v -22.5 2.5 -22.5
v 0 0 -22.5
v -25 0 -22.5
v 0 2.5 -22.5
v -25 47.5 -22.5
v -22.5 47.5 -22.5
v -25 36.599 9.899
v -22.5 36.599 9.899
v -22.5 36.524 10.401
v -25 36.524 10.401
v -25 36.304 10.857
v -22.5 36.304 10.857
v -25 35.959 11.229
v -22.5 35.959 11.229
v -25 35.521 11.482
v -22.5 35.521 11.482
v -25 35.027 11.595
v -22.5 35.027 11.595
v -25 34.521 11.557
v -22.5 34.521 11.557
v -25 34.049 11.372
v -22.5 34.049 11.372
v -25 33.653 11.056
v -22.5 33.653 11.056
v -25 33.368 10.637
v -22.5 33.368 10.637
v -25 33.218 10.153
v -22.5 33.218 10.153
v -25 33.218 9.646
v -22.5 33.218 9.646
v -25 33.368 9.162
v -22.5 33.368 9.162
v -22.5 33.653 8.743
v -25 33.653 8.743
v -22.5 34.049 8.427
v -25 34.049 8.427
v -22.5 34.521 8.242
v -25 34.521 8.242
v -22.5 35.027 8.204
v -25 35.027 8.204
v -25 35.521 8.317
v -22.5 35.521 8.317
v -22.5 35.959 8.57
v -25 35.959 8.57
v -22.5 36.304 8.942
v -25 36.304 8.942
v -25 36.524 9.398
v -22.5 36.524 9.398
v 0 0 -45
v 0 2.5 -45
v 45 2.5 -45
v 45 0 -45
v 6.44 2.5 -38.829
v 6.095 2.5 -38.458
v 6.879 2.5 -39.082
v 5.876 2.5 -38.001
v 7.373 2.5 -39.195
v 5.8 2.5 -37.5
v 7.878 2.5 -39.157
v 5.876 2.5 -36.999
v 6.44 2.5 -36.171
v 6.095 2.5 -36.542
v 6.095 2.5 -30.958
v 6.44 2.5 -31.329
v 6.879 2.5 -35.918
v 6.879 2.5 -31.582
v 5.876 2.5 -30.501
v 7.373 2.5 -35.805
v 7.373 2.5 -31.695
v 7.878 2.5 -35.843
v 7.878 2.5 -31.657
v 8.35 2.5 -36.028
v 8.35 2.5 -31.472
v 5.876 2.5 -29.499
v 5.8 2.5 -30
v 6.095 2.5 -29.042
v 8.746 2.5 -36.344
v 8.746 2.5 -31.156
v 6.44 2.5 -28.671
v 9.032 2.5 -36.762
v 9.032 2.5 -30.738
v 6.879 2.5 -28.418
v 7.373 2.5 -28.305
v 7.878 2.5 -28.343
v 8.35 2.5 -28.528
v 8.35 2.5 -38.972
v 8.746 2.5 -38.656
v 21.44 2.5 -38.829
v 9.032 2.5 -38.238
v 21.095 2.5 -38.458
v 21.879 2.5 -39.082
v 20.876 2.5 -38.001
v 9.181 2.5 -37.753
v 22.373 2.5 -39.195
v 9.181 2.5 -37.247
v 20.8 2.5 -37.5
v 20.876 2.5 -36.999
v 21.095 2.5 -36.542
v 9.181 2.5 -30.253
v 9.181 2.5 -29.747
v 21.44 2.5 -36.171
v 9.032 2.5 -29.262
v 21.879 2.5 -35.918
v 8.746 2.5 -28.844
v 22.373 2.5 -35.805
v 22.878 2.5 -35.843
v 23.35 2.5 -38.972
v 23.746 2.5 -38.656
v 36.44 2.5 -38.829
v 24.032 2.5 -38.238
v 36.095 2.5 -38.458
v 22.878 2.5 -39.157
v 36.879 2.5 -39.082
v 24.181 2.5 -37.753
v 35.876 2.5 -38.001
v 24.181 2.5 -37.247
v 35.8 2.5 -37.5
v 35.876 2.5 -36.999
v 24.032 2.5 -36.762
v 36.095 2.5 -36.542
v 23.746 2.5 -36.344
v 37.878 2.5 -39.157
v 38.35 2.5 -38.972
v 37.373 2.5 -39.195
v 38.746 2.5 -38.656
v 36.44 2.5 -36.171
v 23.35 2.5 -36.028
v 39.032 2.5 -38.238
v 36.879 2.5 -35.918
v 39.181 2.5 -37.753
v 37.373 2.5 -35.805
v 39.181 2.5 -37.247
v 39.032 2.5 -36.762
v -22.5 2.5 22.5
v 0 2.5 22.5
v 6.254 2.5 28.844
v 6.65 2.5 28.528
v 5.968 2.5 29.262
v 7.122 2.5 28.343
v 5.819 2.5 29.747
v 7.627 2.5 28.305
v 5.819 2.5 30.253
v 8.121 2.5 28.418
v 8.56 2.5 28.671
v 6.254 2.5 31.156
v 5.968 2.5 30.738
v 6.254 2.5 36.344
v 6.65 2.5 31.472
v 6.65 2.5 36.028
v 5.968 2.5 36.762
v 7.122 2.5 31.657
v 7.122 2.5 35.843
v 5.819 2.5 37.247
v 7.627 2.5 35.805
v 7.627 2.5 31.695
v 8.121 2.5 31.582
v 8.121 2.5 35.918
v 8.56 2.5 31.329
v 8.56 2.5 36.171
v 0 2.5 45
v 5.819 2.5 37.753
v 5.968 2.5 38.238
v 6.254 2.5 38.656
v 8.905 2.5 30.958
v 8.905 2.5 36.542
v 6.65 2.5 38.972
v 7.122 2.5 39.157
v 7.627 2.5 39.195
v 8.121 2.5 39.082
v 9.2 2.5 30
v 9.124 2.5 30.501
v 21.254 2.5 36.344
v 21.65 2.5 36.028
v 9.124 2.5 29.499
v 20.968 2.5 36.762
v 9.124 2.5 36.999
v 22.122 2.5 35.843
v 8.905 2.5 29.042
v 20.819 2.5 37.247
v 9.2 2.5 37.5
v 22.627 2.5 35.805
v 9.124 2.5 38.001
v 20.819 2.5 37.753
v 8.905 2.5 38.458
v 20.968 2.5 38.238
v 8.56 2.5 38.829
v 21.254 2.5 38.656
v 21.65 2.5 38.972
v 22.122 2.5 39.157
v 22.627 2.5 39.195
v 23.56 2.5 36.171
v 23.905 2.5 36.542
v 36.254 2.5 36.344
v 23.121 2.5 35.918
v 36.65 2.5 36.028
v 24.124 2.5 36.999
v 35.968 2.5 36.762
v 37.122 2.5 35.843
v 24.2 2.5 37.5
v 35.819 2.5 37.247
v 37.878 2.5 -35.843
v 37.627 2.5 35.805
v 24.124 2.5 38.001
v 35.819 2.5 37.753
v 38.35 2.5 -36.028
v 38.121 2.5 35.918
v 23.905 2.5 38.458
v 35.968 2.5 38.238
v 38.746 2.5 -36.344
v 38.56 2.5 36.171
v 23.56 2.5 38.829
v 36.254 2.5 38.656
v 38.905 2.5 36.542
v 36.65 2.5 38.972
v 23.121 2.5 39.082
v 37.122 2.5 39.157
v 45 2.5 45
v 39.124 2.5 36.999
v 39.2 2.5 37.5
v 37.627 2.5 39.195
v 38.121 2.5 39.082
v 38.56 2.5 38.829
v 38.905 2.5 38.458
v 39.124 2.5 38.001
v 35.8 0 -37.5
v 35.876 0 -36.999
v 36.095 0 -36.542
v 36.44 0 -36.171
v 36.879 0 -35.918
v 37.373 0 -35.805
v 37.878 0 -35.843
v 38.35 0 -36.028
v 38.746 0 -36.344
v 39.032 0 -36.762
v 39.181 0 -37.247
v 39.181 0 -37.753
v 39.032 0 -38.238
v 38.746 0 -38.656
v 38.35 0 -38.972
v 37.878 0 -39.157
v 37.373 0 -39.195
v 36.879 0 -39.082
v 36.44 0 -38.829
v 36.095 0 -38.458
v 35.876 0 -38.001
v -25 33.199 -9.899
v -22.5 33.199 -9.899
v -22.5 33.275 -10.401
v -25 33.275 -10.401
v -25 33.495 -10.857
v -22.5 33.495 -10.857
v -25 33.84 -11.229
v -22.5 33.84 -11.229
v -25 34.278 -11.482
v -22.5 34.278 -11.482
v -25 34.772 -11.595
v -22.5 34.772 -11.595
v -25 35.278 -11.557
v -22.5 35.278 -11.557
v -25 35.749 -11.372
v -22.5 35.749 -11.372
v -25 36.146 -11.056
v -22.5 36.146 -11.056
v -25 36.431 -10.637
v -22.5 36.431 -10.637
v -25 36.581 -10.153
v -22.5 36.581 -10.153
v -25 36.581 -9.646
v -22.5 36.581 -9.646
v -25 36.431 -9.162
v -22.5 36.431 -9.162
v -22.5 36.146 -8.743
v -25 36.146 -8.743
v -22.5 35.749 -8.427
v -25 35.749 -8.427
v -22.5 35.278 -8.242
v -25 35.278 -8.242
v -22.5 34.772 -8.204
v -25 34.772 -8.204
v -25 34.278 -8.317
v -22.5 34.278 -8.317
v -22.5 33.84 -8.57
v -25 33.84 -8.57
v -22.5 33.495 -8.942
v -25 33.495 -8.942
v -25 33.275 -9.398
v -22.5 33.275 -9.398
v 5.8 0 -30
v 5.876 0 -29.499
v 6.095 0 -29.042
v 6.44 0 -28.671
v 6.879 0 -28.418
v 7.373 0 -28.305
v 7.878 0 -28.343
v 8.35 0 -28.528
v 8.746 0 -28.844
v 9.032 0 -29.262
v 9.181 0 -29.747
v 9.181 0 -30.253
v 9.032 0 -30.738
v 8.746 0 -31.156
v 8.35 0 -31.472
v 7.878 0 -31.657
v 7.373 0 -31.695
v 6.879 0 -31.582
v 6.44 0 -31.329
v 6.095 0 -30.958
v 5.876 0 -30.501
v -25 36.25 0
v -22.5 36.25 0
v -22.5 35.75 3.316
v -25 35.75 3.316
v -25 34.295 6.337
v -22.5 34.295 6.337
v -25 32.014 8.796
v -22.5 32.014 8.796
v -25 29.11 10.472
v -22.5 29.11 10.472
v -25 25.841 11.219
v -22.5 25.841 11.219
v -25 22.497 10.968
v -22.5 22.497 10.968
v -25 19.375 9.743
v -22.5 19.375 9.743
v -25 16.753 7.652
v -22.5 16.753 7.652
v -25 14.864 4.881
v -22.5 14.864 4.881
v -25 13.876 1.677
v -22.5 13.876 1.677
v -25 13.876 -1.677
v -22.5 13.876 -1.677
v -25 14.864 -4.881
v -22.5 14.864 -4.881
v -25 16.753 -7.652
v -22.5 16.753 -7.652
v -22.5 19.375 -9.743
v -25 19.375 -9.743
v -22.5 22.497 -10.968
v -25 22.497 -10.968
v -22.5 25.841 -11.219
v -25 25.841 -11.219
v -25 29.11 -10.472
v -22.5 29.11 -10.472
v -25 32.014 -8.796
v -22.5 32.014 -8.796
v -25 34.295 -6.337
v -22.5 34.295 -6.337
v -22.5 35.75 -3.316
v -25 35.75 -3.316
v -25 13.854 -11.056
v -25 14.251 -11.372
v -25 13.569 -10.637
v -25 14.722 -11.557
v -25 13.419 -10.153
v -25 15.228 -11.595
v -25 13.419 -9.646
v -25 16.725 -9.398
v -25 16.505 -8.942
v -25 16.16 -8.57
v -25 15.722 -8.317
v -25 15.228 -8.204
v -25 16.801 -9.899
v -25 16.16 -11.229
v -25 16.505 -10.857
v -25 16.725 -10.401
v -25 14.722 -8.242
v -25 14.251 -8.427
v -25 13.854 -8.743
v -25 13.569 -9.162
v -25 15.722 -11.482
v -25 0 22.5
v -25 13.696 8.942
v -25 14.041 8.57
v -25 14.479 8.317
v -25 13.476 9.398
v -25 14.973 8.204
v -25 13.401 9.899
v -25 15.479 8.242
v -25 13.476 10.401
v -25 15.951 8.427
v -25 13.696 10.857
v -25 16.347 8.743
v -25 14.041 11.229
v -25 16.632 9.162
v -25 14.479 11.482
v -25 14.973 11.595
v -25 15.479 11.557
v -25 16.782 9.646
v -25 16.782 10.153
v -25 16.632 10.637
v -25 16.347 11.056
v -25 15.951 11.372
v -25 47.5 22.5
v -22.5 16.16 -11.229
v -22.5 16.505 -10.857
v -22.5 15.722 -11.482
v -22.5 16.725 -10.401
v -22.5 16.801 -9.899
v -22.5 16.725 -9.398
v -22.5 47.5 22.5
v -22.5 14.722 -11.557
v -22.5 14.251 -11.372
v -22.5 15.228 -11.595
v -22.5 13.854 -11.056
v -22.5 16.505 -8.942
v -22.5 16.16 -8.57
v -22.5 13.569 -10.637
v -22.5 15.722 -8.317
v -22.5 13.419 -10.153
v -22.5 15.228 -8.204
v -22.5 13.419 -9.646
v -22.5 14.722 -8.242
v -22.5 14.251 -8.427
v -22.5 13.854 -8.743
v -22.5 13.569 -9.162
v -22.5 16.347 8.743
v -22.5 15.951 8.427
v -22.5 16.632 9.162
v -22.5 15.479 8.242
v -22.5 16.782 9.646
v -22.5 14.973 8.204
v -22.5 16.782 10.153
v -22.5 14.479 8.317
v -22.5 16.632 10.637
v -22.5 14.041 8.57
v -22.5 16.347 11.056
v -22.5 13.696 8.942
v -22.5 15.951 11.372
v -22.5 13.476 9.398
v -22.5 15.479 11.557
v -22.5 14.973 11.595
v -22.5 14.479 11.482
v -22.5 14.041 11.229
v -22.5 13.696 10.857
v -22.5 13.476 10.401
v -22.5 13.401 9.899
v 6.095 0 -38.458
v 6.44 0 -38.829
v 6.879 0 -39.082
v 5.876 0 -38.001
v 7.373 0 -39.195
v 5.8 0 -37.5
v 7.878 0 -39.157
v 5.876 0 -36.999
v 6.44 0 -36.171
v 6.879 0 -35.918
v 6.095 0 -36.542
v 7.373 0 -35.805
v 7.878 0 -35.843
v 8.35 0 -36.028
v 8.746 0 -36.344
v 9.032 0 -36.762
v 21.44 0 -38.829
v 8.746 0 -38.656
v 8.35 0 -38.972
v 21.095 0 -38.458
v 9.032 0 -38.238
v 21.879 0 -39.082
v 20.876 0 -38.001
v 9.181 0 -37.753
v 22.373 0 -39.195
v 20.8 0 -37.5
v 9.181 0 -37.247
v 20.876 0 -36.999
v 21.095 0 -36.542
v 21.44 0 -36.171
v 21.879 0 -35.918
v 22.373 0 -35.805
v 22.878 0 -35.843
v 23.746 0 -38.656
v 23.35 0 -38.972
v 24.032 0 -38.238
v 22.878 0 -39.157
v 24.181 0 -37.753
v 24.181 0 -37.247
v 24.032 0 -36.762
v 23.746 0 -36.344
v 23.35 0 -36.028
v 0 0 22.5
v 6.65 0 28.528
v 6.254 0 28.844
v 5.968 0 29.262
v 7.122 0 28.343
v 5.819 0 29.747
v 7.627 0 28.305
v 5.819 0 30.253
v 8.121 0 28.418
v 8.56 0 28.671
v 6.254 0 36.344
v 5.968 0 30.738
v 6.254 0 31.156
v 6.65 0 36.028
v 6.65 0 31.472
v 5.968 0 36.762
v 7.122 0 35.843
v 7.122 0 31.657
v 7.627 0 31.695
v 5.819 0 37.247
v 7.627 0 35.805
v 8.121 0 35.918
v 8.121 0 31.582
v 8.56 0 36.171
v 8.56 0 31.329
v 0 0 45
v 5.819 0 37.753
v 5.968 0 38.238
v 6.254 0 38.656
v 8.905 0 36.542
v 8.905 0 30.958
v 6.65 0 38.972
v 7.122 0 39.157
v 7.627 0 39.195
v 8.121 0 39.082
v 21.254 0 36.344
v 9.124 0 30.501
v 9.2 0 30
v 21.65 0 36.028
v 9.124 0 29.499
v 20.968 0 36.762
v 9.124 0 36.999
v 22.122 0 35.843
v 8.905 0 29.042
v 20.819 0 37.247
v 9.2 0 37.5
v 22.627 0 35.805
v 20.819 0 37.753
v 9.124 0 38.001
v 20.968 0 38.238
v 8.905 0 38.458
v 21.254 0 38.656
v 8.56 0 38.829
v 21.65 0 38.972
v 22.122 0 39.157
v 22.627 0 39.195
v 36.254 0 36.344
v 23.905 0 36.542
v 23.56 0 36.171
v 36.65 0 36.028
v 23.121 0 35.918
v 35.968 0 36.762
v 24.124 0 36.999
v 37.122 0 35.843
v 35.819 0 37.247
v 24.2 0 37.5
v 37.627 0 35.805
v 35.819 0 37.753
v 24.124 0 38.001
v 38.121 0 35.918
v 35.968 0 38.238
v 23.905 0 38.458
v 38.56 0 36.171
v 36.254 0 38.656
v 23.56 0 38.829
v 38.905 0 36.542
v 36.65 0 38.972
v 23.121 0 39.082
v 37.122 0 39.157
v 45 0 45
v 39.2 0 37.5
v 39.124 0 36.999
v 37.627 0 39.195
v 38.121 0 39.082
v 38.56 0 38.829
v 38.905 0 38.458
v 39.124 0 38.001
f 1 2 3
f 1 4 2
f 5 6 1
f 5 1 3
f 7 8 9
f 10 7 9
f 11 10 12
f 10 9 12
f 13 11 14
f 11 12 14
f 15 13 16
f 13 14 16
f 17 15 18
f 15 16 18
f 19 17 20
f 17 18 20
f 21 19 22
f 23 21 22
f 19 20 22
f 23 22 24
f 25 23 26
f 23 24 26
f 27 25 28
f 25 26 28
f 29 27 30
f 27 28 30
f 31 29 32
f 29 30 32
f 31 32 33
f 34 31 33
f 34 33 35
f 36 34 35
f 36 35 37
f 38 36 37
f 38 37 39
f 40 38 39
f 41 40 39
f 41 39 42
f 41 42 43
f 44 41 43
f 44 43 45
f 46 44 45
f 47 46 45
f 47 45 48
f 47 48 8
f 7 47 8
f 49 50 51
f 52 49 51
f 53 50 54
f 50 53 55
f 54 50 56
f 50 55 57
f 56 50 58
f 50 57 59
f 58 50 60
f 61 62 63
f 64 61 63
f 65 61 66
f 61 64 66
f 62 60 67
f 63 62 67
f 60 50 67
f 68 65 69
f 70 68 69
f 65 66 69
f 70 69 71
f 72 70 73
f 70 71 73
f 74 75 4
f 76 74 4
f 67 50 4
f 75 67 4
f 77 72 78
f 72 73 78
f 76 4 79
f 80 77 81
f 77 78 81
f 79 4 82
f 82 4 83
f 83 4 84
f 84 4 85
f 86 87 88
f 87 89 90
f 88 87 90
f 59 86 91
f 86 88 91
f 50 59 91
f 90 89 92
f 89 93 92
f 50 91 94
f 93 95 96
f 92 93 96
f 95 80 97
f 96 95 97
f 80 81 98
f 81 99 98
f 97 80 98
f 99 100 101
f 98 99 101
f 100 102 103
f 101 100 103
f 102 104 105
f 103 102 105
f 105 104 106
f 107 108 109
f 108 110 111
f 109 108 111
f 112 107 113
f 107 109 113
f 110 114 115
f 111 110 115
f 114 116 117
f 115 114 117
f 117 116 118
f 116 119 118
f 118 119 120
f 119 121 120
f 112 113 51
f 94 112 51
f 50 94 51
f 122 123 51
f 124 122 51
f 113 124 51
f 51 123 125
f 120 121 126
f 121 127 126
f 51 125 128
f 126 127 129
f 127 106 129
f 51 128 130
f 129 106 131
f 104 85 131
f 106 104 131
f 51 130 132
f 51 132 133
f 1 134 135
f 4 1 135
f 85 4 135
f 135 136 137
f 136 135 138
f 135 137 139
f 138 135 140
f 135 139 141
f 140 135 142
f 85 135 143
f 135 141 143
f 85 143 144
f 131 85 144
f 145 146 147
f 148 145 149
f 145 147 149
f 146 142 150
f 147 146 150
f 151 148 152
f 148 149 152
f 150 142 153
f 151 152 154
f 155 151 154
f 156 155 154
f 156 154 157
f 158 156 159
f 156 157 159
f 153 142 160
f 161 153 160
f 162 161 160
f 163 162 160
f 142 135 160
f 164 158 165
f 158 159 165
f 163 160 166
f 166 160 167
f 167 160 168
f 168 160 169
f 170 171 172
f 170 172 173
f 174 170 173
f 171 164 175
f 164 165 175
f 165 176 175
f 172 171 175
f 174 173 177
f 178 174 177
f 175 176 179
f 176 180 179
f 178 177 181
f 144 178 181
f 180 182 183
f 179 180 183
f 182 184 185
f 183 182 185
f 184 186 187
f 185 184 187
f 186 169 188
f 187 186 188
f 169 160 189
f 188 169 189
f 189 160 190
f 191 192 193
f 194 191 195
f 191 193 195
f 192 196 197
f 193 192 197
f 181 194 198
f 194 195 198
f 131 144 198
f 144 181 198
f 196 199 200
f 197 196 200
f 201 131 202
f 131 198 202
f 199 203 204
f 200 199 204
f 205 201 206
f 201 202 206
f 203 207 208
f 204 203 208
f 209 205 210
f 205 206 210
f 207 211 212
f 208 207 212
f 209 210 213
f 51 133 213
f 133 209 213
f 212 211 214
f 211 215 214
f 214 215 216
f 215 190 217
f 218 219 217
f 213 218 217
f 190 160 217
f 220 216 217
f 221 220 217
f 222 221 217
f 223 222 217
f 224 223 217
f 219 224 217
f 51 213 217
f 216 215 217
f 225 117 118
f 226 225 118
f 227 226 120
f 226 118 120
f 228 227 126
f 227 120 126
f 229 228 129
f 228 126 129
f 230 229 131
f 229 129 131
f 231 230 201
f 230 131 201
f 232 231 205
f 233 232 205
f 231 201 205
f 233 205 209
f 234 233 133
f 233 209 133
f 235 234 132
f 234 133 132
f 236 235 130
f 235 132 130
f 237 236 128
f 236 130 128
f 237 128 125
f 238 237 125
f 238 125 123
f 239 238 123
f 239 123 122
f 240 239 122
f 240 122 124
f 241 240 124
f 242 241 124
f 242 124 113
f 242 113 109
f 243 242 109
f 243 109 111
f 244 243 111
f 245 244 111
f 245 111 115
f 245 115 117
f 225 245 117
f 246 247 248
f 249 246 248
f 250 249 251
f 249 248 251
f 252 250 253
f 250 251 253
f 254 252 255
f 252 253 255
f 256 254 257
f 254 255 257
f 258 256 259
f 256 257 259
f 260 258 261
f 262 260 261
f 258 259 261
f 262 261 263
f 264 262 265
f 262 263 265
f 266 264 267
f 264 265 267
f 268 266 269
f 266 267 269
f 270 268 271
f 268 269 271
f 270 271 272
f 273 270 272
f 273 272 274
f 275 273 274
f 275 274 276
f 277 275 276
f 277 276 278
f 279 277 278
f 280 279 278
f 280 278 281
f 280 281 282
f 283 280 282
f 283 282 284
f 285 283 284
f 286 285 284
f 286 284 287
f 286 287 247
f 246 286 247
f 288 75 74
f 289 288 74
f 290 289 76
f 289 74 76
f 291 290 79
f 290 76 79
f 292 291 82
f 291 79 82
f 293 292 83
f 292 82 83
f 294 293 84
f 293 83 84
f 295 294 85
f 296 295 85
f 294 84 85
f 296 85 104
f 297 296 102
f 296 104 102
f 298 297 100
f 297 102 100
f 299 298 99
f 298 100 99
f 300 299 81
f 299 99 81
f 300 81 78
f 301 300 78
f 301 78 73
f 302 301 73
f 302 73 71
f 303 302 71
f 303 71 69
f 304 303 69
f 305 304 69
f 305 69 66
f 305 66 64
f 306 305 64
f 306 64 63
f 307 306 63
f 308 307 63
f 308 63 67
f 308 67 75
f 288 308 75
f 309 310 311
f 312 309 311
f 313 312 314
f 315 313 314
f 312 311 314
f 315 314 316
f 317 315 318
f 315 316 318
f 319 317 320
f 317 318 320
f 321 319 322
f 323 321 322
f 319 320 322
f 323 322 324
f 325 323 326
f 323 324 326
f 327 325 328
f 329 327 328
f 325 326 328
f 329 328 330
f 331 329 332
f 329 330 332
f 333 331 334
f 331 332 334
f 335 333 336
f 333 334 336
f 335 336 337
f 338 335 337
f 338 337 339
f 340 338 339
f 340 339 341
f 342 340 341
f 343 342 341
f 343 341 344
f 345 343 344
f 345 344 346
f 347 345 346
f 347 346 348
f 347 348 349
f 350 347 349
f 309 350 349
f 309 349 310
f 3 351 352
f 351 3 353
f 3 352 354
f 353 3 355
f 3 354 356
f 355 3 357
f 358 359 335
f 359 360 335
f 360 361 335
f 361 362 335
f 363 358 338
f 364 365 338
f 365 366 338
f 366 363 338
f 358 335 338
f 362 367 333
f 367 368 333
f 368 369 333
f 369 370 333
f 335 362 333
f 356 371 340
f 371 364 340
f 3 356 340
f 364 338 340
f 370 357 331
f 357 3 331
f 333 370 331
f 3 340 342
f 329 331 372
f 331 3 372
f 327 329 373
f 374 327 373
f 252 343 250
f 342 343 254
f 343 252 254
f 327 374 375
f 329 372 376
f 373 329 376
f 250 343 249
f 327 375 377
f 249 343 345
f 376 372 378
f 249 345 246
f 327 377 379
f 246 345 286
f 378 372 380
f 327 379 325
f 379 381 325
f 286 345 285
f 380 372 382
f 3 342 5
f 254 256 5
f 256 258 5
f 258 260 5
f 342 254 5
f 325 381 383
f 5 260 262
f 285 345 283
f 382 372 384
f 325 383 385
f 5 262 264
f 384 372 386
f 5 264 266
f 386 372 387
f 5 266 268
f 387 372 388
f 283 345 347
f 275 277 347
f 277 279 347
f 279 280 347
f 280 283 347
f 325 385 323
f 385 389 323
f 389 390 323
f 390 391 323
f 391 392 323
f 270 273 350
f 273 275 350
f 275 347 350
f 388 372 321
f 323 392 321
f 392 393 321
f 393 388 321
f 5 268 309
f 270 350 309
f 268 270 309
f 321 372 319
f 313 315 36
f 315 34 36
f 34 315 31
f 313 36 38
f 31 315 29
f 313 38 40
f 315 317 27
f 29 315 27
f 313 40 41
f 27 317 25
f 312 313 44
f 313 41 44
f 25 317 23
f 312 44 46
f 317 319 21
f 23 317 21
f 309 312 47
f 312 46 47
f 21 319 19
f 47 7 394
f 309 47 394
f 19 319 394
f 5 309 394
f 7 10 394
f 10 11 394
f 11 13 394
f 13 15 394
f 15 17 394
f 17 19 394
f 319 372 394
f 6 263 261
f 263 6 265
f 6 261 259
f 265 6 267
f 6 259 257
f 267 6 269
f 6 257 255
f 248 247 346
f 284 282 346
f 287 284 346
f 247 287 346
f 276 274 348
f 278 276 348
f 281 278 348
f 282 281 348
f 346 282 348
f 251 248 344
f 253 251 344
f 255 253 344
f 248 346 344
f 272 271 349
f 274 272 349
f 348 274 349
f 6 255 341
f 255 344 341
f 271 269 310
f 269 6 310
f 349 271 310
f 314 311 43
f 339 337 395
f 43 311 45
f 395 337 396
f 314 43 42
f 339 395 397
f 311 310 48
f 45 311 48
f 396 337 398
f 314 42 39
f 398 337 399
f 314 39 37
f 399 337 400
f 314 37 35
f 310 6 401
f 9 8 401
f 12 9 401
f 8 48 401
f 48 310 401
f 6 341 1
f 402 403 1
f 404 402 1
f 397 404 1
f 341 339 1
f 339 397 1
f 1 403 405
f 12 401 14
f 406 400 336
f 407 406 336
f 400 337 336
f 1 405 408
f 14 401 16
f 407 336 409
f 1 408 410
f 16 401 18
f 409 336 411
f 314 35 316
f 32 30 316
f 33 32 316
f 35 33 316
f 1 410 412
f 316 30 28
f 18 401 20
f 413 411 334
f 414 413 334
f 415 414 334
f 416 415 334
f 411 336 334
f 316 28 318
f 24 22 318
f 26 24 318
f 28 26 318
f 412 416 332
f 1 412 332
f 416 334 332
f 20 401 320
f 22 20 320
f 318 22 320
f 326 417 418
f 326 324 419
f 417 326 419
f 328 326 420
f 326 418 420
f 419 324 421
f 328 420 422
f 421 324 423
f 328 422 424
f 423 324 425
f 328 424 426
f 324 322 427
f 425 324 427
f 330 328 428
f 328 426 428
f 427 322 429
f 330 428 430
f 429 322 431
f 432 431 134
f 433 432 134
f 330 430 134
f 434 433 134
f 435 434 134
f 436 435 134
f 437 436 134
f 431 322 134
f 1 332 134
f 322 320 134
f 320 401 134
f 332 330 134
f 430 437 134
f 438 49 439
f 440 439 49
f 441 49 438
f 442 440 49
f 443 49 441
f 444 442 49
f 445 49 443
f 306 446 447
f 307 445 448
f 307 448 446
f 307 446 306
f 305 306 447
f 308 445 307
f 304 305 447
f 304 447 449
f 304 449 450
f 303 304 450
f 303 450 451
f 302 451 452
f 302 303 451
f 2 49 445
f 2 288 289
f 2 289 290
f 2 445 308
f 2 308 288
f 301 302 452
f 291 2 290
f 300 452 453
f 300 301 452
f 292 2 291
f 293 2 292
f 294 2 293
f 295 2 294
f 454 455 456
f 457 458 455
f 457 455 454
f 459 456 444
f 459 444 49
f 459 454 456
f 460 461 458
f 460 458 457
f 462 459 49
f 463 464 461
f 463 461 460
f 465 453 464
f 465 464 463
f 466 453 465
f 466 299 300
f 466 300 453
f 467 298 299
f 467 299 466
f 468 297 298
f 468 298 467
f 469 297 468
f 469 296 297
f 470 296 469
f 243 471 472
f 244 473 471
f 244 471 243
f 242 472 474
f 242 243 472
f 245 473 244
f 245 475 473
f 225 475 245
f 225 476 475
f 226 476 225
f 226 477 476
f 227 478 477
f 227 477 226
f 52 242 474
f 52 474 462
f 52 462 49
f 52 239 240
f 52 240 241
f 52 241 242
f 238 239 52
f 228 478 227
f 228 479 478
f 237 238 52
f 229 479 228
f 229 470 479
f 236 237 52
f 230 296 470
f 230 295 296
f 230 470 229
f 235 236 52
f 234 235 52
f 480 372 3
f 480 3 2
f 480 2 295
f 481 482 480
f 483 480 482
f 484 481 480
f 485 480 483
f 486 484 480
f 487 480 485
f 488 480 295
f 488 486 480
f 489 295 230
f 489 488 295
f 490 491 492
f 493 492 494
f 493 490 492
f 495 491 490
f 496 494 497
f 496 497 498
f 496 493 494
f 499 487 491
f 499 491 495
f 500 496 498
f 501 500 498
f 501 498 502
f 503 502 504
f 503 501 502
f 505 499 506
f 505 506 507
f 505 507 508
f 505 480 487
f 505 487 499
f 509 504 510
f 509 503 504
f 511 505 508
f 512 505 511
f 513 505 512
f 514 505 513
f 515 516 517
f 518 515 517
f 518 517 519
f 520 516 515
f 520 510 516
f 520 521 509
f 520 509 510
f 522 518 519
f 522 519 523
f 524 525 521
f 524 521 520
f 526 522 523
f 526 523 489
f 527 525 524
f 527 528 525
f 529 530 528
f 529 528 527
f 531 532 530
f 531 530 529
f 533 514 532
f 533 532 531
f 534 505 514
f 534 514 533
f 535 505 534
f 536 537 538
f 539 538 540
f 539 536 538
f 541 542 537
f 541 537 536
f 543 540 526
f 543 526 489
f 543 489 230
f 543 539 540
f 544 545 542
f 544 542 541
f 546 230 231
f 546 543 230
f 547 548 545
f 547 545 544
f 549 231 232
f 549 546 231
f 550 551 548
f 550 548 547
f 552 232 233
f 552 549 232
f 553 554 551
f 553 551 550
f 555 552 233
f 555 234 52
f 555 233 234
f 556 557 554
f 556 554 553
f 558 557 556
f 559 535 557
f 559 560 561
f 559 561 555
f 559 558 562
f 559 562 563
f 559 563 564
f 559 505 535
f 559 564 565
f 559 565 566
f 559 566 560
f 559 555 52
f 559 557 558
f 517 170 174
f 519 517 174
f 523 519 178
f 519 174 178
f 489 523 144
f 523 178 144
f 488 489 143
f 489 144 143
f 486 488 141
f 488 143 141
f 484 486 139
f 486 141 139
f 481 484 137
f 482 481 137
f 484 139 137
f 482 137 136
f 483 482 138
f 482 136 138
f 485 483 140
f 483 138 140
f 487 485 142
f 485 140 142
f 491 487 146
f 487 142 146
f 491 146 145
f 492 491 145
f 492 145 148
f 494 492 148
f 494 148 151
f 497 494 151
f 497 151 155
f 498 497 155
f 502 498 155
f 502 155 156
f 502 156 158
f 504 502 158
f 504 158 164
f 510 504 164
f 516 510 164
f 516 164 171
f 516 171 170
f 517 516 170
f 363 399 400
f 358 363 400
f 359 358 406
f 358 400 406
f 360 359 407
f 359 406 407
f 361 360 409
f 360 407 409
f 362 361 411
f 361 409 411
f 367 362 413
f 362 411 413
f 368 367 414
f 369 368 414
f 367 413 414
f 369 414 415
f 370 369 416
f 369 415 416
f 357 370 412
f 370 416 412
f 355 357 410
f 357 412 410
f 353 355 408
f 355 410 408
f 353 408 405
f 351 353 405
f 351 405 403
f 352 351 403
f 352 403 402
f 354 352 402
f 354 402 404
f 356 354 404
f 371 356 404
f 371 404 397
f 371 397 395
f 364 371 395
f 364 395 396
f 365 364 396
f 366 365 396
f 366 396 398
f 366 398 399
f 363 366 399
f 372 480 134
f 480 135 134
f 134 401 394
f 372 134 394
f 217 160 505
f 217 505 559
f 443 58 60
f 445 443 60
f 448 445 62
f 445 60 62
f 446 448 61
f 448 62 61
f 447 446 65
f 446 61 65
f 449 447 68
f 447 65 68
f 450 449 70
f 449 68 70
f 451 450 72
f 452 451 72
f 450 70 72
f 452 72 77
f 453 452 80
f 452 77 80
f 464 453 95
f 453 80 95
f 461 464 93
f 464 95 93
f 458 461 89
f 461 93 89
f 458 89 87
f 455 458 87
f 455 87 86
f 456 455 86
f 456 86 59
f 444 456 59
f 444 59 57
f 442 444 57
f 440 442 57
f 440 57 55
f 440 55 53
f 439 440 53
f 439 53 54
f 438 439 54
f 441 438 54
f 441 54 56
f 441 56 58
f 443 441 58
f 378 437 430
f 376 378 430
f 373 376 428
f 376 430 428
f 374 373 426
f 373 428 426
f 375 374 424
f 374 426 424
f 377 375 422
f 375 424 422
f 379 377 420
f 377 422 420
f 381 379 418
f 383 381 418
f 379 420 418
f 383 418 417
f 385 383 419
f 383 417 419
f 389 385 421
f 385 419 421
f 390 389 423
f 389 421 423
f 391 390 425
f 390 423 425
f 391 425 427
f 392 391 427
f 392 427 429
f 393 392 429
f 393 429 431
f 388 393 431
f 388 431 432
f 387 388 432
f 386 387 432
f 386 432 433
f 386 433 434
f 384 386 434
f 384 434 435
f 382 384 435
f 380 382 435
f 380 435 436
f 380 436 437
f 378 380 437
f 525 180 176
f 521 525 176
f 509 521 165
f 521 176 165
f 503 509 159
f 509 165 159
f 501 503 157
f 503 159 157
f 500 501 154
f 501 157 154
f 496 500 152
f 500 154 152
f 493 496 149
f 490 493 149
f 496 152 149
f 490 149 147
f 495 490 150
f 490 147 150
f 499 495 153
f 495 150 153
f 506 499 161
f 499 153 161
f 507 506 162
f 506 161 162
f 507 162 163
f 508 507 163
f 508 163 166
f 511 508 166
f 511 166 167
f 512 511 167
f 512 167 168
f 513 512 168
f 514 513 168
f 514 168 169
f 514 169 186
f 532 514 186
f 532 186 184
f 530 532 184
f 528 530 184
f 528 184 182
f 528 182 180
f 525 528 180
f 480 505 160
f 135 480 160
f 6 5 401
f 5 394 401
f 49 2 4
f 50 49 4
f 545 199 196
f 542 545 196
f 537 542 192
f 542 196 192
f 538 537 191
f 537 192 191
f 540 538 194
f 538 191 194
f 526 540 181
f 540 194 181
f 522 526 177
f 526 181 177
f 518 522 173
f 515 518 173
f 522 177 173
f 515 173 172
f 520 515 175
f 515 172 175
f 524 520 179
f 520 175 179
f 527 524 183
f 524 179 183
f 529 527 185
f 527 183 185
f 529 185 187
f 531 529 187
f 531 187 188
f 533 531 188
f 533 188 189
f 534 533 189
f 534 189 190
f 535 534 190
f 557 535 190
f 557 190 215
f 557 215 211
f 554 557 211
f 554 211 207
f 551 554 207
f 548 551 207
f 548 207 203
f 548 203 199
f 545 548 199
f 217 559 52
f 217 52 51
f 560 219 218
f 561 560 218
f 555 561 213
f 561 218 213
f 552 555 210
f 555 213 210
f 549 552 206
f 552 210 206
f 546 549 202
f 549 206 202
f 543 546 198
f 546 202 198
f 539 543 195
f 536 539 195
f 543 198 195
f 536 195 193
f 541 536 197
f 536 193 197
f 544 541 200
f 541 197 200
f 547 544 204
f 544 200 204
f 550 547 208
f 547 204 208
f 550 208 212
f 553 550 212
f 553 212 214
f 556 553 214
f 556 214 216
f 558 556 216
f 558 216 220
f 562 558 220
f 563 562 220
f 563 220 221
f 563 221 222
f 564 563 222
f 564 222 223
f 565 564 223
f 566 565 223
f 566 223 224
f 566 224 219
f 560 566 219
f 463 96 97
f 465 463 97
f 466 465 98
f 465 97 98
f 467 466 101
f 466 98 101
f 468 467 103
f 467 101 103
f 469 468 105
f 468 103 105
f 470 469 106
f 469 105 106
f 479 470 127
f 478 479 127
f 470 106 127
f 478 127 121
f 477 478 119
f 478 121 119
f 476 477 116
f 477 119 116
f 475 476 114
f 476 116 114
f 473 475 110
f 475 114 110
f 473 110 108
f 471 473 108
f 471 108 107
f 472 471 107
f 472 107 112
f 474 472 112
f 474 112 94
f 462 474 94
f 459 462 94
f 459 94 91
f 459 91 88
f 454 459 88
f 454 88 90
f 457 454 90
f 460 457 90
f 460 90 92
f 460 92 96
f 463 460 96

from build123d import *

# Parameters (mm, degrees)
SKIZZE1_W                       = 45
SKIZZE1_H                       = 2.5
AUFSATZ_LINEAR_AUSTRAGEN1_DEPTH = 45
AUFSATZ_LINEAR_AUSTRAGEN2_DEPTH = 22.5
SKIZZE3_R                       = 11.25
SCHNITT_LINEAR_AUSTRAGEN1_DEPTH = 95.007978385
SKIZZE4_R                       = 1.7
SCHNITT_LINEAR_AUSTRAGEN2_DEPTH = 95.007978385
SKIZZE5_R                       = 1.7
SCHNITT_LINEAR_AUSTRAGEN3_DEPTH = 78.942286341


with BuildPart() as part:
    # Skizze1 → Aufsatz-Linear austragen1 (new, symmetric)
    with BuildSketch(Plane.XY):
        with Locations((22.5, 1.25)):
            Rectangle(SKIZZE1_W, SKIZZE1_H)
    extrude(amount=AUFSATZ_LINEAR_AUSTRAGEN1_DEPTH, both=True)

    # Skizze2 → Aufsatz-Linear austragen2 (add, symmetric)
    with BuildSketch(Plane.XY):
        Polygon((0, 0), (-25, 0), (-25, 47.5), (-22.5, 47.5), (-22.5, 2.5), (0, 2.5), align=None)
    extrude(amount=AUFSATZ_LINEAR_AUSTRAGEN2_DEPTH, both=True)

    # Skizze3 → Schnitt-Linear austragen1 (cut, through all)
    with BuildSketch(Plane(origin=(-22.5, 0, 0), x_dir=(0, 0, -1), z_dir=(1, 0, 0))):
        with Locations(Location((0, 25, 0), (0, 0, 90))):
            Circle(SKIZZE3_R)
    extrude(amount=-SCHNITT_LINEAR_AUSTRAGEN1_DEPTH, mode=Mode.SUBTRACT)

    # Skizze4 → Schnitt-Linear austragen2 (cut, through all)
    with BuildSketch(Plane(origin=(-22.5, 0, 0), x_dir=(0, 0, -1), z_dir=(1, 0, 0))):
        with Locations(Location((-9.899494937, 34.899494937, 0), (0, 0, 90))):
            Circle(SKIZZE4_R)
        with Locations(Location((9.899494937, 34.899494937, 0), (0, 0, 270))):
            Circle(SKIZZE4_R)
        with Locations(Location((-9.899494937, 15.100505063, 0), (0, 0, 270))):
            Circle(SKIZZE4_R)
        with Locations(Location((9.899494937, 15.100505063, 0), (0, 0, 90))):
            Circle(SKIZZE4_R)
    extrude(amount=-SCHNITT_LINEAR_AUSTRAGEN2_DEPTH, mode=Mode.SUBTRACT)

    # Skizze5 → Schnitt-Linear austragen3 (cut, through all)
    with BuildSketch(Plane(origin=(0, 2.5, 0), x_dir=(1, 0, 0), z_dir=(0, 1, 0))):
        with Locations(Location((7.5, 37.5, 0), (0, 0, 180))):
            Circle(SKIZZE5_R)
        with Locations(Location((7.5, 30, 0), (0, 0, 180))):
            Circle(SKIZZE5_R)
        with Locations(Location((22.5, 37.5, 0), (0, 0, 180))):
            Circle(SKIZZE5_R)
        with Locations(Location((37.5, 37.5, 0), (0, 0, 180))):
            Circle(SKIZZE5_R)
        with Locations((7.5, -30)):
            Circle(SKIZZE5_R)
        with Locations((37.5, -37.5)):
            Circle(SKIZZE5_R)
        with Locations((22.5, -37.5)):
            Circle(SKIZZE5_R)
        with Locations((7.5, -37.5)):
            Circle(SKIZZE5_R)
    extrude(amount=-SCHNITT_LINEAR_AUSTRAGEN3_DEPTH, mode=Mode.SUBTRACT)


solid = part.part
